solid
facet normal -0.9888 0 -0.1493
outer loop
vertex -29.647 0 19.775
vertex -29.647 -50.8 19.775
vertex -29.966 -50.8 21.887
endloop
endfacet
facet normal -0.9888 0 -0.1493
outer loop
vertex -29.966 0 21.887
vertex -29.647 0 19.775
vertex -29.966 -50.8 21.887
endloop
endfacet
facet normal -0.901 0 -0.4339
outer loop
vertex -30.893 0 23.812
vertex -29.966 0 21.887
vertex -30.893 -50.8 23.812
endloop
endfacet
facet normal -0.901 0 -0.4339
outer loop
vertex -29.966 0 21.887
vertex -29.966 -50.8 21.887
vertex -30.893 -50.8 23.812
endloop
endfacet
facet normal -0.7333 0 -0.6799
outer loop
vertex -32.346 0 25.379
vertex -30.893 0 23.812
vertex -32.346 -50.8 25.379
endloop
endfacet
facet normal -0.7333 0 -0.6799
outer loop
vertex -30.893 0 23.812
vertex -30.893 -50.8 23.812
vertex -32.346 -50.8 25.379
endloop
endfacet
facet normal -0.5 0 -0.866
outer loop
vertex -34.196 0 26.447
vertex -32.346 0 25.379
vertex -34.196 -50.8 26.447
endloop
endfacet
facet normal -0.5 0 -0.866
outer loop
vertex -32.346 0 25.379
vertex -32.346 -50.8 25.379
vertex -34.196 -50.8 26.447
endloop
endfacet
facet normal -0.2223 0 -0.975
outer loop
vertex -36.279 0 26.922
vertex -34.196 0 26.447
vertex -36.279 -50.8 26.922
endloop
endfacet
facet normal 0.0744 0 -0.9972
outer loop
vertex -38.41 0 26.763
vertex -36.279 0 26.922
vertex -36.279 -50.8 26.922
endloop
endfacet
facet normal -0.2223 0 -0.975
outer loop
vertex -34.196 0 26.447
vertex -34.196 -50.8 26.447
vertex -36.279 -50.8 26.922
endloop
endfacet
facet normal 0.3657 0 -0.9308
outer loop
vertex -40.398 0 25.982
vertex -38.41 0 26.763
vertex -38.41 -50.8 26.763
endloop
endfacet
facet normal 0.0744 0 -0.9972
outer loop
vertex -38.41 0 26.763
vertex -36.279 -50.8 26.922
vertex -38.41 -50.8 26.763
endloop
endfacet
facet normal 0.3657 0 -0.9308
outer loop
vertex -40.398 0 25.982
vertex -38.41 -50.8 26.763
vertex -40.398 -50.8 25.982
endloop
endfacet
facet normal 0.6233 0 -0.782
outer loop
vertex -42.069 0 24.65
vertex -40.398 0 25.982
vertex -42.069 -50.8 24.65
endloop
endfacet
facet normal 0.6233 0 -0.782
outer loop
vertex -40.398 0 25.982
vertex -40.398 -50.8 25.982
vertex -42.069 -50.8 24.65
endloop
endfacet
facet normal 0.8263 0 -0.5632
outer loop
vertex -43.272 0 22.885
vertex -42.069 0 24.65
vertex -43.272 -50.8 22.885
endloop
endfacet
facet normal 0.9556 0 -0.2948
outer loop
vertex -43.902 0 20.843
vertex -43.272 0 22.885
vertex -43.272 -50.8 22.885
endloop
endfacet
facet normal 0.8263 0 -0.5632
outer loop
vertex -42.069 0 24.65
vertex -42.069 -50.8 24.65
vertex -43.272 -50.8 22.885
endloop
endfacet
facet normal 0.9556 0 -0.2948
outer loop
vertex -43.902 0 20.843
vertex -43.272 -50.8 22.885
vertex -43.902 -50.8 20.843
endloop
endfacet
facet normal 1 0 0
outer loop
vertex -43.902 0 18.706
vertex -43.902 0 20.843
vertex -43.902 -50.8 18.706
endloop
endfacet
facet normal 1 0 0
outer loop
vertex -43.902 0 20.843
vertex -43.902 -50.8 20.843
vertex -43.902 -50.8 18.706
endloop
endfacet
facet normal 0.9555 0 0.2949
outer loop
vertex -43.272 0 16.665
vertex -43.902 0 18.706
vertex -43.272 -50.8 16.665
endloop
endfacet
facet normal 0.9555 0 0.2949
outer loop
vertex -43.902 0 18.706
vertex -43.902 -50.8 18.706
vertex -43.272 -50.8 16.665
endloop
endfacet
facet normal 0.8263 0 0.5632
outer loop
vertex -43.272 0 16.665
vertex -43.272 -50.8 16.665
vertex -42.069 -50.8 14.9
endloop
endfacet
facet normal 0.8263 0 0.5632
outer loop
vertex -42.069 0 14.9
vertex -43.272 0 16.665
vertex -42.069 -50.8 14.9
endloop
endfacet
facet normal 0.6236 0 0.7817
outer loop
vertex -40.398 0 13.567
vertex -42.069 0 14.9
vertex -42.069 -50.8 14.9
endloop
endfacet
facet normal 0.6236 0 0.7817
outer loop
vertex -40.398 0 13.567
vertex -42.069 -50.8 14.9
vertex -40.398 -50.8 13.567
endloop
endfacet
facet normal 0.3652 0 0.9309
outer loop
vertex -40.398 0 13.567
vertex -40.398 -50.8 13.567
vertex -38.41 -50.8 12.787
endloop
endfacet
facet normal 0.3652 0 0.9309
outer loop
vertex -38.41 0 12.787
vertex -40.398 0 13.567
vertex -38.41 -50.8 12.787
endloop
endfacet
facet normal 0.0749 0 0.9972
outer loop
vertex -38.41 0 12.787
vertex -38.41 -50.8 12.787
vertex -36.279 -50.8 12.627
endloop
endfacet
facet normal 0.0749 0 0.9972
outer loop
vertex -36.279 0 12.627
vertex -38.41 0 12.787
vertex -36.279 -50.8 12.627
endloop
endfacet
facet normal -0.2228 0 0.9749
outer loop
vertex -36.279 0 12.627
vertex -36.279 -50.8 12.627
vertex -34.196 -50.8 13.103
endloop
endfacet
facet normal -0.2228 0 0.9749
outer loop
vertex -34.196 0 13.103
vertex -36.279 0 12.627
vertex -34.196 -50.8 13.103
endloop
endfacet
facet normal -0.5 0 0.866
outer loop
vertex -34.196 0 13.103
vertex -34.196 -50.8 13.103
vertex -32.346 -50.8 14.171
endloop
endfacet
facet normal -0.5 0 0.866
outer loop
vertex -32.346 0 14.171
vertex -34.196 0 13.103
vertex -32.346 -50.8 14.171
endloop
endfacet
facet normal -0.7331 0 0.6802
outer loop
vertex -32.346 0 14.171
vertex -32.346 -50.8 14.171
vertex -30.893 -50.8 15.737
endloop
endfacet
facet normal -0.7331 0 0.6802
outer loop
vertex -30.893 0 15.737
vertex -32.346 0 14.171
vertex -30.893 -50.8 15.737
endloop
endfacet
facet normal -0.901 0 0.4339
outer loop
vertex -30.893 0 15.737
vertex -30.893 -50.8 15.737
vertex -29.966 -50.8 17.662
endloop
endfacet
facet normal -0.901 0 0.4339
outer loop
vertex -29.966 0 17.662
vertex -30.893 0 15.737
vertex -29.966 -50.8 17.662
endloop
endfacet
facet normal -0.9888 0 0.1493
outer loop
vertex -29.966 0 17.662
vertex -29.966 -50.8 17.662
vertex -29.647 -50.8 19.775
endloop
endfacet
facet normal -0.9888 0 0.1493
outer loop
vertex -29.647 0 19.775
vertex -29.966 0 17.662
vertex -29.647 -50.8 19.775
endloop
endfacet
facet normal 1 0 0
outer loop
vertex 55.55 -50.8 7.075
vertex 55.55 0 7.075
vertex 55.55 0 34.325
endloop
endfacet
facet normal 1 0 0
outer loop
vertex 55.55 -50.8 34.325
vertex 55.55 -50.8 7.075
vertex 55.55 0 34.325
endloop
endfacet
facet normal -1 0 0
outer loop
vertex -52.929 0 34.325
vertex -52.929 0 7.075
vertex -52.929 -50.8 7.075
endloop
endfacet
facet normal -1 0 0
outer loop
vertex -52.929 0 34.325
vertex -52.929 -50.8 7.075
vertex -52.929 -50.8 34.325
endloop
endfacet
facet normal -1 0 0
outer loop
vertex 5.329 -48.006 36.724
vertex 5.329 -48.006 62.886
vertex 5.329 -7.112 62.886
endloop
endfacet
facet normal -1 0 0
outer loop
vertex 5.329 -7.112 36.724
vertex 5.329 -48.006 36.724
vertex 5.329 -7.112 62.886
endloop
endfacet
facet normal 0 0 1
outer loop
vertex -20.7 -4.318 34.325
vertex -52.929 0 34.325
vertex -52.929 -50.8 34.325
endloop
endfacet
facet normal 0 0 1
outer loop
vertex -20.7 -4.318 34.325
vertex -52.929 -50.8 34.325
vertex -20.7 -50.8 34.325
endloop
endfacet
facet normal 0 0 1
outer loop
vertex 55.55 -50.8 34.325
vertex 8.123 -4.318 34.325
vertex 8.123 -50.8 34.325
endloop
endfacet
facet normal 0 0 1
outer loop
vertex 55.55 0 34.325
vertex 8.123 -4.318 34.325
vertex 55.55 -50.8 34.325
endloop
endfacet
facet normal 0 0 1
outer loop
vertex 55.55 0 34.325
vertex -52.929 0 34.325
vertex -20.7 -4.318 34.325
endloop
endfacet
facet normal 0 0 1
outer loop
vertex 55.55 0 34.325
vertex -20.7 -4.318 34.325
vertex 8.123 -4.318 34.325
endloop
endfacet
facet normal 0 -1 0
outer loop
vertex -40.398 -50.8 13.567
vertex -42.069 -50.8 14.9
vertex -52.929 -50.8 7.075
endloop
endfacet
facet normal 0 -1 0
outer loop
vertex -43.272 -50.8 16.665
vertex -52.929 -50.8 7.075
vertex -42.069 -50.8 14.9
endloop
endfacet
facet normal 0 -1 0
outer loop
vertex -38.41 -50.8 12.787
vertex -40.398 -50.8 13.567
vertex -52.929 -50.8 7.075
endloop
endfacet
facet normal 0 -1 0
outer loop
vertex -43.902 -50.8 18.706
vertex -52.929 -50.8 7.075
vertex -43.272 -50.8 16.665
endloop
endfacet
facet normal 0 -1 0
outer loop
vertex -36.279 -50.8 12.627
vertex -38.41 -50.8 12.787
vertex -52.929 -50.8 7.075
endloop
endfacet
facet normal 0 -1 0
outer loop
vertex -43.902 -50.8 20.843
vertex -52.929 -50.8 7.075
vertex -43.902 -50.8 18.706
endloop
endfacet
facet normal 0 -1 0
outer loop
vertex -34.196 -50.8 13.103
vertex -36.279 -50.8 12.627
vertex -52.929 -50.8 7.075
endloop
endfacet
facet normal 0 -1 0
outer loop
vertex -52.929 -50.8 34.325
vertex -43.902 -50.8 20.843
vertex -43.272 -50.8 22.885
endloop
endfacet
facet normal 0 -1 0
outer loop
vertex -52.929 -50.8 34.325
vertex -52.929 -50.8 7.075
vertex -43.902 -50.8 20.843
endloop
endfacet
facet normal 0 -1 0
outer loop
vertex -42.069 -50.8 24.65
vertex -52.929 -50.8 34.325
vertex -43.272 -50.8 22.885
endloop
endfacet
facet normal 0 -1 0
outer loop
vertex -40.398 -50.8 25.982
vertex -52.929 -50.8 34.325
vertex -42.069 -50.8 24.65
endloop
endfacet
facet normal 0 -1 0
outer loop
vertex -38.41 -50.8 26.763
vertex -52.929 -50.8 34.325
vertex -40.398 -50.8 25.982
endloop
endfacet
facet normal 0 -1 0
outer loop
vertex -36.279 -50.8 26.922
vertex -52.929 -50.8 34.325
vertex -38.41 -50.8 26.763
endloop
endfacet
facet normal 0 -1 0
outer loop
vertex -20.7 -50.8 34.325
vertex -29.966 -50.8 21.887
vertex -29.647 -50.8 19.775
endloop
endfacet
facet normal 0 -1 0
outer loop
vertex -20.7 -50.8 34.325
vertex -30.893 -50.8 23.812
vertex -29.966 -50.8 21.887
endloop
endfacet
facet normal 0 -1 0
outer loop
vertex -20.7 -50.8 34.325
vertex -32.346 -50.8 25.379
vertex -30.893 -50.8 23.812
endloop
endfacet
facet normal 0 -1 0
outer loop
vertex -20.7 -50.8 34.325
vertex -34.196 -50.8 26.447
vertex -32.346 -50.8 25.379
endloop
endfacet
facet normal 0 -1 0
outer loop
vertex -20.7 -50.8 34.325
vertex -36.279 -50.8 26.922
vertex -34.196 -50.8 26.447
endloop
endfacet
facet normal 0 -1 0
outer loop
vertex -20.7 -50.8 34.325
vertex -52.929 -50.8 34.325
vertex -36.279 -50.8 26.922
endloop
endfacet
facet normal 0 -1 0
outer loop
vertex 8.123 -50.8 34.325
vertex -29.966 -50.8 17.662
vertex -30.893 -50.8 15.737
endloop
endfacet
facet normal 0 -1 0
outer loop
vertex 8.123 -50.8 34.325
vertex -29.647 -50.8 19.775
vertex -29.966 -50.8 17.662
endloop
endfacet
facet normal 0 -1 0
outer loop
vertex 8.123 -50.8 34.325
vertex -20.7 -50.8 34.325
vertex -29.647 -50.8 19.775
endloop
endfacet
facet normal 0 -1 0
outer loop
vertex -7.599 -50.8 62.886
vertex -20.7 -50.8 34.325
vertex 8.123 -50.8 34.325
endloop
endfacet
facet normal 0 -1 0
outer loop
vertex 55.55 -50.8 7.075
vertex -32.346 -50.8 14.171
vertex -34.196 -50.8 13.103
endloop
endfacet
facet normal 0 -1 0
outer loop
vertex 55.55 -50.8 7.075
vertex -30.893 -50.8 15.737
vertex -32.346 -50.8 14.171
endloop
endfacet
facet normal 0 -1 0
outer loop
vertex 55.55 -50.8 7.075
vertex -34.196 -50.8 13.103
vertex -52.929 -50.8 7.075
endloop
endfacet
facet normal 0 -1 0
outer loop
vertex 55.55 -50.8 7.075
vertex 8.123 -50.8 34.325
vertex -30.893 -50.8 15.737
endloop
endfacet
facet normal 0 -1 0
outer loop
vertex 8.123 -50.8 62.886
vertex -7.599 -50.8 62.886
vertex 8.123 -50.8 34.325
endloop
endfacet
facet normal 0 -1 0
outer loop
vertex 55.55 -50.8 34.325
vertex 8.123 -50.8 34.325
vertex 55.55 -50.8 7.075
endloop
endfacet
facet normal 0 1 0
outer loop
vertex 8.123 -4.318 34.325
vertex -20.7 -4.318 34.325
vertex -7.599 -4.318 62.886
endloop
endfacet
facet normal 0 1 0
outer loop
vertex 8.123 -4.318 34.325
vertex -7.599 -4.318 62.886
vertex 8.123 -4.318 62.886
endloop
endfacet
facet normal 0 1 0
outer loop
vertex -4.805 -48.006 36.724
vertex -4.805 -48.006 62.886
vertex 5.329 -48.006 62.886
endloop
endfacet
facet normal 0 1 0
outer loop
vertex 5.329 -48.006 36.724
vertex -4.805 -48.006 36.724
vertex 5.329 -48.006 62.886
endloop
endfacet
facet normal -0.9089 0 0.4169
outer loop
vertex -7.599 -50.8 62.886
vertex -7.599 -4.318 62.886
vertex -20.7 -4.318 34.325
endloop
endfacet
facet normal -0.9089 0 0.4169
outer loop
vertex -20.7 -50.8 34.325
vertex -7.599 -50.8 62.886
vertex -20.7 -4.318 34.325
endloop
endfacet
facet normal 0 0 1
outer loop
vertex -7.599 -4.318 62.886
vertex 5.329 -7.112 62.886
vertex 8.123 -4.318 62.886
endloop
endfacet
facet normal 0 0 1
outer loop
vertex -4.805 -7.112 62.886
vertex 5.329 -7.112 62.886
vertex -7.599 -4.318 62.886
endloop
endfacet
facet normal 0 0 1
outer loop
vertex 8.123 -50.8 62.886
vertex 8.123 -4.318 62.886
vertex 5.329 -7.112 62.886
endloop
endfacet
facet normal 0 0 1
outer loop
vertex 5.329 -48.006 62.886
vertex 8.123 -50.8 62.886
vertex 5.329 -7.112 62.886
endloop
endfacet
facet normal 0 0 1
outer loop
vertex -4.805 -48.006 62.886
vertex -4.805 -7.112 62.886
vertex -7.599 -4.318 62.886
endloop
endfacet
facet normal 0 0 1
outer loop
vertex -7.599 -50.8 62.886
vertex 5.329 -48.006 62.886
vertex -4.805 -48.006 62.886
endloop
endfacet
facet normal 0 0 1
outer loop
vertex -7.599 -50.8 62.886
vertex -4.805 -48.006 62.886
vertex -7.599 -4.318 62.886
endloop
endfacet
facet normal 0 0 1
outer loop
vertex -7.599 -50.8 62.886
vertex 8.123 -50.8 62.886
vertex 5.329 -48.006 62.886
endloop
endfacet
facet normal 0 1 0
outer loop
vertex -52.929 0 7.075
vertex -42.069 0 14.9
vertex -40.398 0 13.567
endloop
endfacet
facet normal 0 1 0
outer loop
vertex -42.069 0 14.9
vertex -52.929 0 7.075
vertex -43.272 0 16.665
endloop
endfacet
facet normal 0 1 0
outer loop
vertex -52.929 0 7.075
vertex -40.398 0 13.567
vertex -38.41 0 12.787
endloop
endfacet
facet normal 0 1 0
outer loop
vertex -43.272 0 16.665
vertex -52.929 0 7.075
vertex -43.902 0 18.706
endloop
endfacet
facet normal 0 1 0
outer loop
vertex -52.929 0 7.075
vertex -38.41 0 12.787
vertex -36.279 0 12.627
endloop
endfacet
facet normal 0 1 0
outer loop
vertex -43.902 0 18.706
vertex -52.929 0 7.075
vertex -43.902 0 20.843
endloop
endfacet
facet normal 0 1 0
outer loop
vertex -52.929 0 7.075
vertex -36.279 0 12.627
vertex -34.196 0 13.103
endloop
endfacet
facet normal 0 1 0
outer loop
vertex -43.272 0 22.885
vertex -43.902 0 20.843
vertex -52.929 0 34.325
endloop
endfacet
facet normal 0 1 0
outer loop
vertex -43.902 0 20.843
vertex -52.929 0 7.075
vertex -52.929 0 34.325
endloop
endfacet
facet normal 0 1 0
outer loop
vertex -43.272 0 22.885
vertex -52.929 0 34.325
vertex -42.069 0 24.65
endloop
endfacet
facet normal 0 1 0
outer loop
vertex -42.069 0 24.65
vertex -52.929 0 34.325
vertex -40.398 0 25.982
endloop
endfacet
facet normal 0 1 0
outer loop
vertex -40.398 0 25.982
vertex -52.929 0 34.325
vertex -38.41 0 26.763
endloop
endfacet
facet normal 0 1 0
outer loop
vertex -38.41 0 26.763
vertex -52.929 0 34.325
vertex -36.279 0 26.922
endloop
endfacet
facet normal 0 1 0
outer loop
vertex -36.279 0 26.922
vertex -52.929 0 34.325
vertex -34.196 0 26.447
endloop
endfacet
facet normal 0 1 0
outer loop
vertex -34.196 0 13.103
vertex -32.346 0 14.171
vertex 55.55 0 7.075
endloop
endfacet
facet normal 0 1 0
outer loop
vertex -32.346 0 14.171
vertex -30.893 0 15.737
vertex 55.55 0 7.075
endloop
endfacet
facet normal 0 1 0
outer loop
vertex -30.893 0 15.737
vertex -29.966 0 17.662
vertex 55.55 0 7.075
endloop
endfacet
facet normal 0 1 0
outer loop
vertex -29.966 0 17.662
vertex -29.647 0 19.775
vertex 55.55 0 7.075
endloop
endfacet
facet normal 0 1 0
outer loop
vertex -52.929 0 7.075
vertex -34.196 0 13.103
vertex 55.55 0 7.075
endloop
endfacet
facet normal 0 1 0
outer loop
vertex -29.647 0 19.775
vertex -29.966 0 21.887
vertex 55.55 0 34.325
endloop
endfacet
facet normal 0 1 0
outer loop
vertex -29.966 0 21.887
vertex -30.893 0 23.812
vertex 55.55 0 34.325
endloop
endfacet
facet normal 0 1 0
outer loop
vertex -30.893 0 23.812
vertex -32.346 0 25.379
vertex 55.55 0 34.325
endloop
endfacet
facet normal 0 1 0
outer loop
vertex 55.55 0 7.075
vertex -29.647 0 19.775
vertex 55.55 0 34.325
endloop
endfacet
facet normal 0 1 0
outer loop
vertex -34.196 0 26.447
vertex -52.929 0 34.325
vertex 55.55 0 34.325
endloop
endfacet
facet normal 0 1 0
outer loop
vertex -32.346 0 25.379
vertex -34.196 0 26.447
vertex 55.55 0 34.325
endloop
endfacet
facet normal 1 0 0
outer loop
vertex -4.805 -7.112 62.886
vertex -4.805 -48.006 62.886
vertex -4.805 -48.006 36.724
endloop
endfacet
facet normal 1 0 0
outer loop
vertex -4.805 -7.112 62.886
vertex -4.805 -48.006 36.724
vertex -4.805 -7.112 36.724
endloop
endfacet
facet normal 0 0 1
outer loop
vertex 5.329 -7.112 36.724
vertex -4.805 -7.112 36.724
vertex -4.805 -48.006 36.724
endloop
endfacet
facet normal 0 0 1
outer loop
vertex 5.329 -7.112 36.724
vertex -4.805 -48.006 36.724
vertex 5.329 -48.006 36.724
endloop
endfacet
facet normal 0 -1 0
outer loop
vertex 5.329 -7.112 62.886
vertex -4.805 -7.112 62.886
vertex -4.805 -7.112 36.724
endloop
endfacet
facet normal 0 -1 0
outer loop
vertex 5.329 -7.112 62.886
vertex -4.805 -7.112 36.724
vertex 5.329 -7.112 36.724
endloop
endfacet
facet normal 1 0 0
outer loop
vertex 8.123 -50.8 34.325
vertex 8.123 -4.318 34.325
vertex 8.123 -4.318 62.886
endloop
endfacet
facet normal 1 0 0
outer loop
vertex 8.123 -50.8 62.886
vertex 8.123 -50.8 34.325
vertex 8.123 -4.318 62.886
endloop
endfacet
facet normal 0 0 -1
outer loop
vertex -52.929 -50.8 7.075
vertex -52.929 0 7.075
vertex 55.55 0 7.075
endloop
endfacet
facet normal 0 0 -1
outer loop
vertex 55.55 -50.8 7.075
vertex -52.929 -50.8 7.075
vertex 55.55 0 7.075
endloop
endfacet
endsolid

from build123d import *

# Parameters (mm, degrees)
F0_W     = 108.4789782763
F0_H     = 27.2507588379
F1_DEPTH = 50.8
F3_DEPTH = 46.482
F4_R     = 7.1675152866
F5_DEPTH = 50.801
F6_W     = 10.1335914806
F6_H     = 40.894000291
F7_DEPTH = 26.162


with BuildPart() as f1:
    # F0 (on Front) → F1 (new body)
    with BuildSketch(Plane.XZ):
        with Locations((1.3101398945, 20.7000973169)):
            Rectangle(F0_W, F0_H)
    extrude(amount=F1_DEPTH)

    # F2 (on face) → F3 (join)
    with BuildSketch(Plane.XZ.offset(50.8)):
        Polygon((-7.5987614691, 62.886364758), (-20.7000877708, 34.3254767358), (8.1228297204, 34.3254767358), (8.1228297204, 62.886364758), align=None)
    extrude(amount=-F3_DEPTH)

    # F4 (on face) → F5 (cut, through all)
    with BuildSketch(Plane.XZ.offset(50.8)):
        with Locations((-36.8147185072, 19.7747178979)):
            Circle(F4_R)
    extrude(amount=-F5_DEPTH, mode=Mode.SUBTRACT)

    # F6 (on face) → F7 (cut)
    with BuildSketch(Plane.XY.offset(62.886364758)):
        with Locations((0.2620341256, -27.559)):
            Rectangle(F6_W, F6_H)
    extrude(amount=-F7_DEPTH, mode=Mode.SUBTRACT)


solid = f1.part
